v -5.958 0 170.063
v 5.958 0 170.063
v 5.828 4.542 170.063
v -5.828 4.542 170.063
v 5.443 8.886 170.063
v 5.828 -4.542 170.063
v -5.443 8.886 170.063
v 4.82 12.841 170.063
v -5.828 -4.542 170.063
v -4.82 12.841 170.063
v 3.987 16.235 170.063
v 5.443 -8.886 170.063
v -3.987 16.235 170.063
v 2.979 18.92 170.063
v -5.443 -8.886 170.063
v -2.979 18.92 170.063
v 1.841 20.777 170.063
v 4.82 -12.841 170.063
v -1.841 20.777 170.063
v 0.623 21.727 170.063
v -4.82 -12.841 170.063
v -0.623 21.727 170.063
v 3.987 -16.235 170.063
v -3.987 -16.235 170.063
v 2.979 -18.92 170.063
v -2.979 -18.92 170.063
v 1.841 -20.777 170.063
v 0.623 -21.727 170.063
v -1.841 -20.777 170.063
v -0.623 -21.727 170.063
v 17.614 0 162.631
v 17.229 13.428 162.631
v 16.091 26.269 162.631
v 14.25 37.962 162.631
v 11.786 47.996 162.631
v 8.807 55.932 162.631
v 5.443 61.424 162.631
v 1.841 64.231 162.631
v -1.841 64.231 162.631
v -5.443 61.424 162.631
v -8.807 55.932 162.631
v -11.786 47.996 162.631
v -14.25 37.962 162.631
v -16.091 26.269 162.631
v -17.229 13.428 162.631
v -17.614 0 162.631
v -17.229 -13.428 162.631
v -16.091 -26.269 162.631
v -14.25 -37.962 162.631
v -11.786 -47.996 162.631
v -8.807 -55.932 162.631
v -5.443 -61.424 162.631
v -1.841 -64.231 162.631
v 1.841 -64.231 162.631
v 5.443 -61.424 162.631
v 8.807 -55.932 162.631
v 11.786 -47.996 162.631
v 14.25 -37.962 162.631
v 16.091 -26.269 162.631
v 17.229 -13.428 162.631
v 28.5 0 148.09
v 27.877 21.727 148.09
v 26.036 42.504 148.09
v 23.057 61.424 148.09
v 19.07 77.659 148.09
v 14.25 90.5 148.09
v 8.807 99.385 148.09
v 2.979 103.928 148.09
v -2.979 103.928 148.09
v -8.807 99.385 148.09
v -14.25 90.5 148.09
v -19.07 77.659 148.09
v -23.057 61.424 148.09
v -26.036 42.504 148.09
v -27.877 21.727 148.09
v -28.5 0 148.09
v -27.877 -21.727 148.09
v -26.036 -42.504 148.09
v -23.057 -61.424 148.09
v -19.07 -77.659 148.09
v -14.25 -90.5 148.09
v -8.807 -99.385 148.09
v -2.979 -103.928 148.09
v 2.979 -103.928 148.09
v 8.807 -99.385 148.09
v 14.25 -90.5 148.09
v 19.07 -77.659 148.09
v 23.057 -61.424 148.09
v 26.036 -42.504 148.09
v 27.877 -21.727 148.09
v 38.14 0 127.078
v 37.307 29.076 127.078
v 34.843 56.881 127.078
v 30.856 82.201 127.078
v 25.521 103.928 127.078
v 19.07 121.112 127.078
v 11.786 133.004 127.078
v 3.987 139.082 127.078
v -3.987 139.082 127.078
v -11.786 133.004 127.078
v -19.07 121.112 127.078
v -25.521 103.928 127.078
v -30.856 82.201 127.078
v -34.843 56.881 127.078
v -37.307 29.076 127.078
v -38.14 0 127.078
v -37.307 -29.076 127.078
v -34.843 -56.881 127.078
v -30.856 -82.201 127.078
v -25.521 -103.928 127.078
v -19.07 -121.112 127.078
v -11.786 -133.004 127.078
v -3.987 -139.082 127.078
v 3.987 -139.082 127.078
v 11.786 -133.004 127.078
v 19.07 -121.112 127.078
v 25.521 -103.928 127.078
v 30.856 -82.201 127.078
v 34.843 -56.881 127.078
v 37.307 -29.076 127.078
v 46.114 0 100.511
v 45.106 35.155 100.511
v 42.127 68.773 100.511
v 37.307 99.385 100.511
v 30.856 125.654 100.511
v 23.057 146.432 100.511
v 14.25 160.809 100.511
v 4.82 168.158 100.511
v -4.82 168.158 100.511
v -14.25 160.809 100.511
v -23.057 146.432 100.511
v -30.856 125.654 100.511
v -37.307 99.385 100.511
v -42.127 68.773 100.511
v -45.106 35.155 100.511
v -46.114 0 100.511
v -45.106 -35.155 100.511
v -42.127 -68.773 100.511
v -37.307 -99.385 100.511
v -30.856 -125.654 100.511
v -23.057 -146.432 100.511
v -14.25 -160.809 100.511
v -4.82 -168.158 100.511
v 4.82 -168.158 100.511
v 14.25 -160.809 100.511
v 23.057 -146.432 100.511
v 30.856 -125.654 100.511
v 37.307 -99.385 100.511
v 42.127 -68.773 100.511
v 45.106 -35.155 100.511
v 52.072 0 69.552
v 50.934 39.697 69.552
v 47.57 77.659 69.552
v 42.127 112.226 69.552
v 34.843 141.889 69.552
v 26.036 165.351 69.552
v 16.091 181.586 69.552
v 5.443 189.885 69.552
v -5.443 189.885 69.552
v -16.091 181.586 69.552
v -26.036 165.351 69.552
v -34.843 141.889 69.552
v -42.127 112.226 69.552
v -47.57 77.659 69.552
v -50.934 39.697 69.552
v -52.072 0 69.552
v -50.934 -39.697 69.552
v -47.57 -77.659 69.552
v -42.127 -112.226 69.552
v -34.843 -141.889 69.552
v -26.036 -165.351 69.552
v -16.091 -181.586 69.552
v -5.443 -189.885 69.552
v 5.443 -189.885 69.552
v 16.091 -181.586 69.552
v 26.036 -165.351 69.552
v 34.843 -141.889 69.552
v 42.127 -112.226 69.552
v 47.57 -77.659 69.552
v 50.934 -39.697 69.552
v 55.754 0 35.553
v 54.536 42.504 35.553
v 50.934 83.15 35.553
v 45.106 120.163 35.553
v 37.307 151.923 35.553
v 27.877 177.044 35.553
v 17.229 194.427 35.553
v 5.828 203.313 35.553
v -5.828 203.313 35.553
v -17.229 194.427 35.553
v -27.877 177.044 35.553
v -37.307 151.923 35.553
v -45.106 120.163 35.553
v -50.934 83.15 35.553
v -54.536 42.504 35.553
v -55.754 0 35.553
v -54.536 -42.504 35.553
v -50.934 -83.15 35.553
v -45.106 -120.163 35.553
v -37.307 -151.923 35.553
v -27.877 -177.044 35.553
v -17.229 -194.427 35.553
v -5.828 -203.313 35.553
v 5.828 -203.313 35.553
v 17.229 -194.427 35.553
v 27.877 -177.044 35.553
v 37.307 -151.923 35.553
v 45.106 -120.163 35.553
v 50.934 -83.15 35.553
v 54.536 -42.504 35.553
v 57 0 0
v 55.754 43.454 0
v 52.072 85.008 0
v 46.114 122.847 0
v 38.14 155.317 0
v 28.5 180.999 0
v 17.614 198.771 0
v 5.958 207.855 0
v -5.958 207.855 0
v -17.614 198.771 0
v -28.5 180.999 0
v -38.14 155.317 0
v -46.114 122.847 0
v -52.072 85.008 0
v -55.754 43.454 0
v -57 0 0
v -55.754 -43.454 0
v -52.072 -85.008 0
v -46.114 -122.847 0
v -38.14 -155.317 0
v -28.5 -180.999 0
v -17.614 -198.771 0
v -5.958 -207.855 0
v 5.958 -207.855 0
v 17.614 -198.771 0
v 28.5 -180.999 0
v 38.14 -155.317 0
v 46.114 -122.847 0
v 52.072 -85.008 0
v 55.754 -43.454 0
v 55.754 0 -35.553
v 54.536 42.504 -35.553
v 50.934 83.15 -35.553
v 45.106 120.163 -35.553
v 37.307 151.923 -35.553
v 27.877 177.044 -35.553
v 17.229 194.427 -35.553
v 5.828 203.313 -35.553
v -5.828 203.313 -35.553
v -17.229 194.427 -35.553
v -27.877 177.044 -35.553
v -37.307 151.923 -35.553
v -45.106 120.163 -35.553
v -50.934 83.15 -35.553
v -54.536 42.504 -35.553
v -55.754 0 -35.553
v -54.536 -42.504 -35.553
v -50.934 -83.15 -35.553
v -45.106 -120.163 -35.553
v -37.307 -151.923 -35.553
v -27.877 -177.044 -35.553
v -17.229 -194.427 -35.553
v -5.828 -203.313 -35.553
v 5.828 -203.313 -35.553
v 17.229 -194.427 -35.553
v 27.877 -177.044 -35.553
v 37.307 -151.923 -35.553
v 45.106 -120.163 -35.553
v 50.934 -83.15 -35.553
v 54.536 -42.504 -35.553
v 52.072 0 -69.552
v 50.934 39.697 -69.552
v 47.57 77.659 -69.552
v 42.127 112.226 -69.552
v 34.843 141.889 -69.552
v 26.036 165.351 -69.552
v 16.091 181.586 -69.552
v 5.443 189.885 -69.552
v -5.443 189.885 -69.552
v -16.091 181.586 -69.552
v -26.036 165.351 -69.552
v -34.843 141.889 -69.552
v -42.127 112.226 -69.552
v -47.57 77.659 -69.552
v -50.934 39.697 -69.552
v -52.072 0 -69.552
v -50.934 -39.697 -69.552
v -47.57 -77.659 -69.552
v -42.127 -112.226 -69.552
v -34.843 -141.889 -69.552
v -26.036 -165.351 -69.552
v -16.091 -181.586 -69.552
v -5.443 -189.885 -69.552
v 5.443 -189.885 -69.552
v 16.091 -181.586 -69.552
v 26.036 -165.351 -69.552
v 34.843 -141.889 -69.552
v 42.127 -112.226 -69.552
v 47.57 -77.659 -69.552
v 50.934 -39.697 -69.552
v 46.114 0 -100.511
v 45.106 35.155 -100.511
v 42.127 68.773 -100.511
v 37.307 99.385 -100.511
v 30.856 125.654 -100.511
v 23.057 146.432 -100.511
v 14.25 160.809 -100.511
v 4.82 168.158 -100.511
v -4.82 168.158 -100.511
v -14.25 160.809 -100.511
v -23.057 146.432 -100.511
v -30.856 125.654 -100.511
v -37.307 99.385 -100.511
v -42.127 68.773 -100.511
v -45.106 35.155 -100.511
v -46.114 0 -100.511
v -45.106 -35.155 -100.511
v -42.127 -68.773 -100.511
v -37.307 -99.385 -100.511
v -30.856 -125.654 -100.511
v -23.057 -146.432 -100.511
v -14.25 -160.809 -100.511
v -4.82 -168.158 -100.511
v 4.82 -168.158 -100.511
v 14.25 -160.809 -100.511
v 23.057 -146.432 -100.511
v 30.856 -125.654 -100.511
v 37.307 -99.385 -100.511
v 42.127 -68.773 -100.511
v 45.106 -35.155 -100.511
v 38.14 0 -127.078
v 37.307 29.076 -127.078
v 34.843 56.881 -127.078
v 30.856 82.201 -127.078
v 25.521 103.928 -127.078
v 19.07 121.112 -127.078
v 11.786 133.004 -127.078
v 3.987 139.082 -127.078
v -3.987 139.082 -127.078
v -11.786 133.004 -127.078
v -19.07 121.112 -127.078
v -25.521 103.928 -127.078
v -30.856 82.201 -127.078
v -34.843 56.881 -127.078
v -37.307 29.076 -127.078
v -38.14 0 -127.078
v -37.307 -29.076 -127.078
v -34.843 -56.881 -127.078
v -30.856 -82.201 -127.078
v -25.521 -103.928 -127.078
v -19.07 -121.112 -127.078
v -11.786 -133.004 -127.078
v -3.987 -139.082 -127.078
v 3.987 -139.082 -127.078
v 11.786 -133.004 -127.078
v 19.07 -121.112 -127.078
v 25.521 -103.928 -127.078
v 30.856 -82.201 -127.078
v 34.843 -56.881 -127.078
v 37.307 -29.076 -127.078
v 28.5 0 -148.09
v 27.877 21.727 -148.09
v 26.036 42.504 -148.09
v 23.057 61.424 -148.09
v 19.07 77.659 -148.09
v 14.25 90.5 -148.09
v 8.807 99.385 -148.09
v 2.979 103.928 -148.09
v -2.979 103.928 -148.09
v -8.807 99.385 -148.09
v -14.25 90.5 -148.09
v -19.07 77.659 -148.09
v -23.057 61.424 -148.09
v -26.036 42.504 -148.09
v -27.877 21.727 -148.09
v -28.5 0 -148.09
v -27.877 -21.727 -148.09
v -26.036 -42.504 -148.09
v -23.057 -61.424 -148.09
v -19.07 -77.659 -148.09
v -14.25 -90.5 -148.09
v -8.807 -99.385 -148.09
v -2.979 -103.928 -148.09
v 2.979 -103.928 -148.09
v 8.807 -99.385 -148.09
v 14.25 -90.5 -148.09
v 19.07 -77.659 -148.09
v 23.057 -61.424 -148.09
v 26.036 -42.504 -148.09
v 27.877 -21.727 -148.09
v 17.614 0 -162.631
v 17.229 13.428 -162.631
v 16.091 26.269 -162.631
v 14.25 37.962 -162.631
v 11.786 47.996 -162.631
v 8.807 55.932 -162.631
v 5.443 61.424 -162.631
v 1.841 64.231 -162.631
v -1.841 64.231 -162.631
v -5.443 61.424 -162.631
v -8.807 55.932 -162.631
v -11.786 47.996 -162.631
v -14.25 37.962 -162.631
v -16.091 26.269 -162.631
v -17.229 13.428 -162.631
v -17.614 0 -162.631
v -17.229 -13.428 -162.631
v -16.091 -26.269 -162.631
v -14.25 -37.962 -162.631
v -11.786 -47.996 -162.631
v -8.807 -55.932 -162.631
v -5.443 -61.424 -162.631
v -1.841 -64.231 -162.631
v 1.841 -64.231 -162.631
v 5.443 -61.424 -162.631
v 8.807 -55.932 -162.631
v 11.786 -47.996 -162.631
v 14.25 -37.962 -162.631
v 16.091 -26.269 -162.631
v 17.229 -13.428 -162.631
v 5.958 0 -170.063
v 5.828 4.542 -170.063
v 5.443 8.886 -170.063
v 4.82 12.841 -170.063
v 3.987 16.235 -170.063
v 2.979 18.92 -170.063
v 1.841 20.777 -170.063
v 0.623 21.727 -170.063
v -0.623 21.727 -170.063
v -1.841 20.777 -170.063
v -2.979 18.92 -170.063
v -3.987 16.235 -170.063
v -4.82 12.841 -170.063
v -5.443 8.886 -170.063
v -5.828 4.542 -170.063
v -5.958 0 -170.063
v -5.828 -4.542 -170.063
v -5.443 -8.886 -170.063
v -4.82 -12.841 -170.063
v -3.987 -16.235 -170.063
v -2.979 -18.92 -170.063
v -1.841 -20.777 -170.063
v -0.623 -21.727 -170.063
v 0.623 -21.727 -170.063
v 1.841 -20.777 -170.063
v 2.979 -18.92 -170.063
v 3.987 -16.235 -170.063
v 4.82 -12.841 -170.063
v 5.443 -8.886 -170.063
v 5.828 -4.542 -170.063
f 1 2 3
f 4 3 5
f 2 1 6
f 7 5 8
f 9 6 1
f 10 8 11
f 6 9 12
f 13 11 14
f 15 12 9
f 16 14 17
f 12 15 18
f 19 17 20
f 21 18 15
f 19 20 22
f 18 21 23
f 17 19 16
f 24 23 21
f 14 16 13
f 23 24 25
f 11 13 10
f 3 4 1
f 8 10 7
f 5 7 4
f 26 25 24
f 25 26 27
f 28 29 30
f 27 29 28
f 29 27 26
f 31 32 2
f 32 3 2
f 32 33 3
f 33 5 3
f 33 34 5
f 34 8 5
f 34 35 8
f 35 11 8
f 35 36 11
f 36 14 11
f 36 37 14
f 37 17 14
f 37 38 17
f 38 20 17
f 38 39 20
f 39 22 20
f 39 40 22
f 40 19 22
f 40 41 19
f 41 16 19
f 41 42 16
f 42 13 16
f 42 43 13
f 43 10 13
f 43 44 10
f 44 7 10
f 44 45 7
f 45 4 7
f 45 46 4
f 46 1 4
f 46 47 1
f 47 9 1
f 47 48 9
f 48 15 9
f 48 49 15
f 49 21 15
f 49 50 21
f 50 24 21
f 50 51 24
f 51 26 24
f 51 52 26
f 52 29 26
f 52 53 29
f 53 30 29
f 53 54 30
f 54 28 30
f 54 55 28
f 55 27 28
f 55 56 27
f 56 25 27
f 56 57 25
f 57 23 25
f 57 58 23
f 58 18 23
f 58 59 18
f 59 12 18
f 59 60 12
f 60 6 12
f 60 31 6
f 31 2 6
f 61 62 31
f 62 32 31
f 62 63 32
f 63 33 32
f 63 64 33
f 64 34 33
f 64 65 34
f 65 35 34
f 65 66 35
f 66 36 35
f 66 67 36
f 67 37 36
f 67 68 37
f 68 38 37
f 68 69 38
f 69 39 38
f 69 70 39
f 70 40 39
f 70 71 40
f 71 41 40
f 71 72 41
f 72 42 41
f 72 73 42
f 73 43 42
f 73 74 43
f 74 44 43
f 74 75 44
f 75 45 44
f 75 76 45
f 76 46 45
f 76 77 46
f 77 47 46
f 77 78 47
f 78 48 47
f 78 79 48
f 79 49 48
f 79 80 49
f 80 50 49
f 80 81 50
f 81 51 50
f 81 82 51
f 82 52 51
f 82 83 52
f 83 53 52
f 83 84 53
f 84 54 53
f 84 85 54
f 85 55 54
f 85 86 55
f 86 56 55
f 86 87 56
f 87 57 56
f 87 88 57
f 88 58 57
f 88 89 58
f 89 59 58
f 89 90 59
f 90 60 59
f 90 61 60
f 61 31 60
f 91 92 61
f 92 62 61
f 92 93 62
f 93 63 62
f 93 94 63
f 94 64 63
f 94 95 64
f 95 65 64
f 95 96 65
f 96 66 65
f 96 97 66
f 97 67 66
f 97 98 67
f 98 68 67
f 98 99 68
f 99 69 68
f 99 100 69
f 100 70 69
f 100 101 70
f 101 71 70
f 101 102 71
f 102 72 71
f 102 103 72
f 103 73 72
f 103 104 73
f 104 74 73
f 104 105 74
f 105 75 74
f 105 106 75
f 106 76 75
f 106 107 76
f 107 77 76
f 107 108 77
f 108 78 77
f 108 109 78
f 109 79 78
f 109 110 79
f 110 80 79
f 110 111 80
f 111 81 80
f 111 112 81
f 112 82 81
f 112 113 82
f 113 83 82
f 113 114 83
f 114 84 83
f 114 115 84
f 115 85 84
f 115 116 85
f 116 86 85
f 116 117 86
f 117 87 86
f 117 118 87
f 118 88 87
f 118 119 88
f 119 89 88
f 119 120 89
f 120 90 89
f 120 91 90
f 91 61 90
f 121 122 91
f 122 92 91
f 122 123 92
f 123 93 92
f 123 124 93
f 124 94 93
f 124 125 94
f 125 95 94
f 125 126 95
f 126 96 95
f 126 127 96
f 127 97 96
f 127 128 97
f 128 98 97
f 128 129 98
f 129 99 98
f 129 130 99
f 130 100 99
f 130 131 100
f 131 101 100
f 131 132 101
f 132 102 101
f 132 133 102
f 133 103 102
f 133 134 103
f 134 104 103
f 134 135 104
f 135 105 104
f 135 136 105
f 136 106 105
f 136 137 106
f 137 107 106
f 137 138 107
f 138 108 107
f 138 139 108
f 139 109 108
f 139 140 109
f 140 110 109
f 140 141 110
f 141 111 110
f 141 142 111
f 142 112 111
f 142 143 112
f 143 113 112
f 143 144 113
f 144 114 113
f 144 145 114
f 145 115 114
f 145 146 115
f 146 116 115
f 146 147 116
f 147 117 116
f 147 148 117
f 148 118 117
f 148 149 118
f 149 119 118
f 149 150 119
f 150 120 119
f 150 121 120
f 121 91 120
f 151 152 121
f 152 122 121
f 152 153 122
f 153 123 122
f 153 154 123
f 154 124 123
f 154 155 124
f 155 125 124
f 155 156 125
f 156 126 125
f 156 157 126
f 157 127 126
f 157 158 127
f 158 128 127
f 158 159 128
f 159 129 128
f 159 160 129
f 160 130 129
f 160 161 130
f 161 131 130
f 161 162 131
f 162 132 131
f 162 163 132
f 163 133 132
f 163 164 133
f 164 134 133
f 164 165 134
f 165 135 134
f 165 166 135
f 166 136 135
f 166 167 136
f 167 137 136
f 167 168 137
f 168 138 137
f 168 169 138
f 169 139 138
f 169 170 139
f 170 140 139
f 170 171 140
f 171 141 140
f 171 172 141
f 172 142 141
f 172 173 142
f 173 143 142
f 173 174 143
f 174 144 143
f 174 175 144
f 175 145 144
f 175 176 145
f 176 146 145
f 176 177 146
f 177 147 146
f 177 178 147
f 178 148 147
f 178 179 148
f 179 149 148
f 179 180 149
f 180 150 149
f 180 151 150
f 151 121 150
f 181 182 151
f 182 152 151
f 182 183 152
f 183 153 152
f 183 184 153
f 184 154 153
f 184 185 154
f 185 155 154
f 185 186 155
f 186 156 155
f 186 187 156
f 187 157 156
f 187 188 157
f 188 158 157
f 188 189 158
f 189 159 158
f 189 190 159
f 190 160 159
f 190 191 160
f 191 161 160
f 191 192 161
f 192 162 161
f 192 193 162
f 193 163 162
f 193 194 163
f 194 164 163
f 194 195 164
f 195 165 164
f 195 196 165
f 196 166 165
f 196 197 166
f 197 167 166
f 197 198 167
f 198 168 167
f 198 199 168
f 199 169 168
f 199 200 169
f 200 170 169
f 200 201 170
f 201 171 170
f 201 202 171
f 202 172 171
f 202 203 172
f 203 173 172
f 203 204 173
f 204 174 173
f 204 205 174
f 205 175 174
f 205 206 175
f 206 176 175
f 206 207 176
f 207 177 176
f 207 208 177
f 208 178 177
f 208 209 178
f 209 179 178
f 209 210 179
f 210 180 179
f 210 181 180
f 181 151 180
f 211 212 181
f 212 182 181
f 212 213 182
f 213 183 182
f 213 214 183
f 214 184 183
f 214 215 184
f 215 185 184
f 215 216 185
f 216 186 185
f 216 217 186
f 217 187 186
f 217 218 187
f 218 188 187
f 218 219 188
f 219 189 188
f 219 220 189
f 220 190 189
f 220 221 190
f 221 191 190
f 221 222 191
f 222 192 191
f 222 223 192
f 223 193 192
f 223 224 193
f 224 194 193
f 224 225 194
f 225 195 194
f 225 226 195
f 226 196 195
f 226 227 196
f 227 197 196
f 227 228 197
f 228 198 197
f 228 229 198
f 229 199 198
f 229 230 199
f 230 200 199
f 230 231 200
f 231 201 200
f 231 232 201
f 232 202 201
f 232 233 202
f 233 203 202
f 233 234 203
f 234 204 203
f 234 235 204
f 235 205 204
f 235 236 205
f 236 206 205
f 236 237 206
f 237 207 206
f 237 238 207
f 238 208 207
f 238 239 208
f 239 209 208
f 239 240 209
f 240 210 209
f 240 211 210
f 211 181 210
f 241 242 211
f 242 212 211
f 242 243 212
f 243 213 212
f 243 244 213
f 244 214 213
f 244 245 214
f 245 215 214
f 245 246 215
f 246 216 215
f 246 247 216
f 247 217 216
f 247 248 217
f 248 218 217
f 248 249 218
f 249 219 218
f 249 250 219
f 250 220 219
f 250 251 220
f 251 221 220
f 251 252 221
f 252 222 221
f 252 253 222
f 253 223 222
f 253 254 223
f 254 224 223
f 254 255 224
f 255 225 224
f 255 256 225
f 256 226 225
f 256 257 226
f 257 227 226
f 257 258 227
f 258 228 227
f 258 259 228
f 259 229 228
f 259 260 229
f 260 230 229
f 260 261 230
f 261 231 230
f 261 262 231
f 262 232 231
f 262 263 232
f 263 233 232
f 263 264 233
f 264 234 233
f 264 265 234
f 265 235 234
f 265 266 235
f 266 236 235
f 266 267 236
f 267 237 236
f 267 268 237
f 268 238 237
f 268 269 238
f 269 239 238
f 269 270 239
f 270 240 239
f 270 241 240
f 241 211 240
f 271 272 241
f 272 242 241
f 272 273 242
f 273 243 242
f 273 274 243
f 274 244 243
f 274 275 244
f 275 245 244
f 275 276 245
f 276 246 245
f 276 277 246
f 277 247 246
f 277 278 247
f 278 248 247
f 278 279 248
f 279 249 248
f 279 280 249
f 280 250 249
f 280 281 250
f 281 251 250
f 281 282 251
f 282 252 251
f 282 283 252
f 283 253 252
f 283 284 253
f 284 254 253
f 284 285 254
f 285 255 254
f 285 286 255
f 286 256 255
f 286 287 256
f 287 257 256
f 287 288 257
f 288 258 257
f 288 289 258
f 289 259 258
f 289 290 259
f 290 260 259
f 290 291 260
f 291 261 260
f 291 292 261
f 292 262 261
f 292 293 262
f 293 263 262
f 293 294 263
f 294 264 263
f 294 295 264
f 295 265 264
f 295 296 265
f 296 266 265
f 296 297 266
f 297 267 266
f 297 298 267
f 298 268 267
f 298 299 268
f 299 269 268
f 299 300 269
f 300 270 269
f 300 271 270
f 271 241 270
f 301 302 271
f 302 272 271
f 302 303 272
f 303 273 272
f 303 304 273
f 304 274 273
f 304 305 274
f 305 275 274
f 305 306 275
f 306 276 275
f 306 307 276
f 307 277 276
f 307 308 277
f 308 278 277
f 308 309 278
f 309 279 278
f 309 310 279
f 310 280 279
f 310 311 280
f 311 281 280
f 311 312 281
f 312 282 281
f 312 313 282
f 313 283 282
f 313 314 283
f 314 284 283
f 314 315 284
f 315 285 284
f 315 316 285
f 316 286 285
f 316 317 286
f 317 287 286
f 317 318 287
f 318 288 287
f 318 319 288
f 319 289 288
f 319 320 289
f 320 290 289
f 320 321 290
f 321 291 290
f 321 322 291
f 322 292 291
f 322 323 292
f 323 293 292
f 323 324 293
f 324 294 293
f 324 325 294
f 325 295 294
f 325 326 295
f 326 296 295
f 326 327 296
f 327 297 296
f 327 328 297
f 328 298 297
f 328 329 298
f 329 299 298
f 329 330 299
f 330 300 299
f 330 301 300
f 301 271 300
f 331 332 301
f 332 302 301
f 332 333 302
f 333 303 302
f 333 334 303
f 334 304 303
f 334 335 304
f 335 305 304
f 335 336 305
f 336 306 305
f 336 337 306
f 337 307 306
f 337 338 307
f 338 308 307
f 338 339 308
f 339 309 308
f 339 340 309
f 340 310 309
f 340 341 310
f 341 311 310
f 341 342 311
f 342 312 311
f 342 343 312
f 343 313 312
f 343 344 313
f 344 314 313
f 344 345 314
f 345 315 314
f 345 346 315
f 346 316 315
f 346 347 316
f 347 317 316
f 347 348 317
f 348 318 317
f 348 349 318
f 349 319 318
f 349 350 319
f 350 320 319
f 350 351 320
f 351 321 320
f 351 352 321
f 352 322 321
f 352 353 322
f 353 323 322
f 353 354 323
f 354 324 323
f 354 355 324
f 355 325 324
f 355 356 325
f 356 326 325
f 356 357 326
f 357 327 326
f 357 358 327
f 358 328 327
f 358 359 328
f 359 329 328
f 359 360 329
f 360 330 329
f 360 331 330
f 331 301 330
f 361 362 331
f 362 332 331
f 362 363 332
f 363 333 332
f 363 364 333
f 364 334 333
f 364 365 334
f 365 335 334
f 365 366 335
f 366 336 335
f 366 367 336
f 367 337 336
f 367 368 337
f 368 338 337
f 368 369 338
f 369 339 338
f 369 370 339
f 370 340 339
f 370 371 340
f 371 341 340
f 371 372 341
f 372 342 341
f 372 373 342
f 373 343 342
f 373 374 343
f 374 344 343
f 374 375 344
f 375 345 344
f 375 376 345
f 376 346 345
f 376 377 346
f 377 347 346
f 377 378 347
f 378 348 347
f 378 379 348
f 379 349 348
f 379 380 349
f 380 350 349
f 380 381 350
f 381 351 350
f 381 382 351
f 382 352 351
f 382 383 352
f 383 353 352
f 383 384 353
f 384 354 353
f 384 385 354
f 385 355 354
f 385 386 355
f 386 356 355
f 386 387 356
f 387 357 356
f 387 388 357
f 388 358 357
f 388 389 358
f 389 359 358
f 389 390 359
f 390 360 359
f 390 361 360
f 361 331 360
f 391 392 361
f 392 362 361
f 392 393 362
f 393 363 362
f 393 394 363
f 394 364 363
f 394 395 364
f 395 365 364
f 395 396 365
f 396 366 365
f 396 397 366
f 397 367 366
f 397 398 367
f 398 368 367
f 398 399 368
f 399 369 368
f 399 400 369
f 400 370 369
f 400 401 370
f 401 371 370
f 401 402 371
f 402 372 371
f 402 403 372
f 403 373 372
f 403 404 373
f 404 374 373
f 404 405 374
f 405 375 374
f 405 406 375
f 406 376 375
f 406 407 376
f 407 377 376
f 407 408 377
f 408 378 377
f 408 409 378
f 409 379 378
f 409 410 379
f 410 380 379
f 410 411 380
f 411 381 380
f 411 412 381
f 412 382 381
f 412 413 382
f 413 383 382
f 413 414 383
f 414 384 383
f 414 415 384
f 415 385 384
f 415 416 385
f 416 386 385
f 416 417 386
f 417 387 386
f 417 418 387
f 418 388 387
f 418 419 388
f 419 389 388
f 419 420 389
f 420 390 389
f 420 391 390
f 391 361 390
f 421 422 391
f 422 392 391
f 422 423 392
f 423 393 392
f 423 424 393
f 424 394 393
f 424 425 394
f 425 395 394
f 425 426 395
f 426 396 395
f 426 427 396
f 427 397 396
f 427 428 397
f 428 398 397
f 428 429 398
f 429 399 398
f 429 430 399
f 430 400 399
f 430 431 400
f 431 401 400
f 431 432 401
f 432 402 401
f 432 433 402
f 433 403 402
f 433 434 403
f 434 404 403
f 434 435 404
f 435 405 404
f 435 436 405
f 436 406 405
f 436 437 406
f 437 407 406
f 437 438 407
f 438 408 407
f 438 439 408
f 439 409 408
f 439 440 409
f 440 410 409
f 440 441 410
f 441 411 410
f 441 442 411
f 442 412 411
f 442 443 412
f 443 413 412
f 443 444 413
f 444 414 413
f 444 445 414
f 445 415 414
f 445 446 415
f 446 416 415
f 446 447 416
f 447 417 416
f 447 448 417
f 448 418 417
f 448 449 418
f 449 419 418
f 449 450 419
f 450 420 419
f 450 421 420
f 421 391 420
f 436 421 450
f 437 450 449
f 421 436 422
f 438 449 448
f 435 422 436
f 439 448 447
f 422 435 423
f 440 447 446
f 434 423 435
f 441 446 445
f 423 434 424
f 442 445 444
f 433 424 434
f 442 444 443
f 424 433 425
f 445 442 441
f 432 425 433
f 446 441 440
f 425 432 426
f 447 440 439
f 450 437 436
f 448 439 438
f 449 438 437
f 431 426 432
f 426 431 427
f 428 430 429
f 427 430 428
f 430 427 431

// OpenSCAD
// Generated by SolidPython 1.0.1 on 2020-07-29 00:46:45


scale(v = [3, 11, 9]) {
	sphere(r = 19);
}
/***********************************************
*********      SolidPython code:      **********
************************************************
 
# import packages: SolidPython
from solid import *
from solid.utils import *
from itertools import chain, combinations, permutations


class Resize:

    def __init__(self, scad_file):
        self.scad_file = scad_file
        #self.scad_file = import_scad(scad_file)
        # cone/cylinder param:
        self.r1 = 0
        self.r2 = 0
        self.h = 0
        # rectangular prism param:
        self.w = 0
        self.l = 0
        # ellipse param:
        self.r = 0

    # import OpenScad code (file name corresponds to shape)


    # classify shape + parameters
    def assign(self, param1, param2, param3):
        if self.scad_file == 'cone.scad':
            self.r1 = param1
            self.r2 = param2
            self.h = param3
        elif self.scad_file == 'cylinder.scad':
            self.r1 = param1
            self.r2 = param2
            self.h = param3
        elif self.scad_file == 'rectangularPrism.scad':
            self.h = param1
            self.l = param2
            self.w = param3
        else:
            self.r = param1
            self.h = param2

    # resize parameters
    def iterate(self):
        x = range(3, 20, 2)
        i = 1
        if self.scad_file == 'cone.scad':
            tempList = list(permutations(x, 2))
            for temp in tempList:
                param1 = temp[0]
                param2 = temp[1]
                filepath = 'produced_scad_files/' + 'cone' + str(param1) + '_' + str(param2) + '_' + '.scad'
                scad_render_to_file(cylinder(h=param1, r1=param2, r2=0), filepath)

        elif self.scad_file == 'cylinder.scad':
            tempList = list(permutations(x, 3))
            for temp in tempList:
                param1 = temp[0]
                param2 = temp[1]
                filepath = 'produced_scad_files/' + 'cylinder' + str(param1) + '_' + str(param2) + '_' + '.scad'
                scad_render_to_file(cylinder(h=param1, r1=param2, r2=param2), filepath)

        elif self.scad_file == 'rectangularPrism.scad':
            tempList = list(permutations(x, 3))
            for temp in tempList:
                param1 = temp[0]
                param2 = temp[1]
                param3 = temp[2]
                filepath = 'produced_scad_files/' + 'rectangularPrism' + str(param1) + '_' + str(param2) + '_' + str(
                    param3) + '.scad'
                scad_render_to_file(cube(size=(param1, param2, param3)), filepath)

        elif self.scad_file == 'ellipse.scad':
            tempList = list(permutations(x, 4))
            for temp in tempList:
                param1 = temp[0]
                param2 = temp[1]
                param3 = temp[2]
                param4 = temp[3]
                filepath = 'produced_scad_files/' + 'ellipse' + str(param1) + '_' + str(param2) + '_' + str(param3) + '_' + str(param4) + '.scad'
                scad_render_to_file(scale([param1, param2, param3])(sphere(r=param4)), filepath)

    def render_to_scadfile(self):
        scad_render_to_file(scad, 'example.scad') 
 
************************************************/
